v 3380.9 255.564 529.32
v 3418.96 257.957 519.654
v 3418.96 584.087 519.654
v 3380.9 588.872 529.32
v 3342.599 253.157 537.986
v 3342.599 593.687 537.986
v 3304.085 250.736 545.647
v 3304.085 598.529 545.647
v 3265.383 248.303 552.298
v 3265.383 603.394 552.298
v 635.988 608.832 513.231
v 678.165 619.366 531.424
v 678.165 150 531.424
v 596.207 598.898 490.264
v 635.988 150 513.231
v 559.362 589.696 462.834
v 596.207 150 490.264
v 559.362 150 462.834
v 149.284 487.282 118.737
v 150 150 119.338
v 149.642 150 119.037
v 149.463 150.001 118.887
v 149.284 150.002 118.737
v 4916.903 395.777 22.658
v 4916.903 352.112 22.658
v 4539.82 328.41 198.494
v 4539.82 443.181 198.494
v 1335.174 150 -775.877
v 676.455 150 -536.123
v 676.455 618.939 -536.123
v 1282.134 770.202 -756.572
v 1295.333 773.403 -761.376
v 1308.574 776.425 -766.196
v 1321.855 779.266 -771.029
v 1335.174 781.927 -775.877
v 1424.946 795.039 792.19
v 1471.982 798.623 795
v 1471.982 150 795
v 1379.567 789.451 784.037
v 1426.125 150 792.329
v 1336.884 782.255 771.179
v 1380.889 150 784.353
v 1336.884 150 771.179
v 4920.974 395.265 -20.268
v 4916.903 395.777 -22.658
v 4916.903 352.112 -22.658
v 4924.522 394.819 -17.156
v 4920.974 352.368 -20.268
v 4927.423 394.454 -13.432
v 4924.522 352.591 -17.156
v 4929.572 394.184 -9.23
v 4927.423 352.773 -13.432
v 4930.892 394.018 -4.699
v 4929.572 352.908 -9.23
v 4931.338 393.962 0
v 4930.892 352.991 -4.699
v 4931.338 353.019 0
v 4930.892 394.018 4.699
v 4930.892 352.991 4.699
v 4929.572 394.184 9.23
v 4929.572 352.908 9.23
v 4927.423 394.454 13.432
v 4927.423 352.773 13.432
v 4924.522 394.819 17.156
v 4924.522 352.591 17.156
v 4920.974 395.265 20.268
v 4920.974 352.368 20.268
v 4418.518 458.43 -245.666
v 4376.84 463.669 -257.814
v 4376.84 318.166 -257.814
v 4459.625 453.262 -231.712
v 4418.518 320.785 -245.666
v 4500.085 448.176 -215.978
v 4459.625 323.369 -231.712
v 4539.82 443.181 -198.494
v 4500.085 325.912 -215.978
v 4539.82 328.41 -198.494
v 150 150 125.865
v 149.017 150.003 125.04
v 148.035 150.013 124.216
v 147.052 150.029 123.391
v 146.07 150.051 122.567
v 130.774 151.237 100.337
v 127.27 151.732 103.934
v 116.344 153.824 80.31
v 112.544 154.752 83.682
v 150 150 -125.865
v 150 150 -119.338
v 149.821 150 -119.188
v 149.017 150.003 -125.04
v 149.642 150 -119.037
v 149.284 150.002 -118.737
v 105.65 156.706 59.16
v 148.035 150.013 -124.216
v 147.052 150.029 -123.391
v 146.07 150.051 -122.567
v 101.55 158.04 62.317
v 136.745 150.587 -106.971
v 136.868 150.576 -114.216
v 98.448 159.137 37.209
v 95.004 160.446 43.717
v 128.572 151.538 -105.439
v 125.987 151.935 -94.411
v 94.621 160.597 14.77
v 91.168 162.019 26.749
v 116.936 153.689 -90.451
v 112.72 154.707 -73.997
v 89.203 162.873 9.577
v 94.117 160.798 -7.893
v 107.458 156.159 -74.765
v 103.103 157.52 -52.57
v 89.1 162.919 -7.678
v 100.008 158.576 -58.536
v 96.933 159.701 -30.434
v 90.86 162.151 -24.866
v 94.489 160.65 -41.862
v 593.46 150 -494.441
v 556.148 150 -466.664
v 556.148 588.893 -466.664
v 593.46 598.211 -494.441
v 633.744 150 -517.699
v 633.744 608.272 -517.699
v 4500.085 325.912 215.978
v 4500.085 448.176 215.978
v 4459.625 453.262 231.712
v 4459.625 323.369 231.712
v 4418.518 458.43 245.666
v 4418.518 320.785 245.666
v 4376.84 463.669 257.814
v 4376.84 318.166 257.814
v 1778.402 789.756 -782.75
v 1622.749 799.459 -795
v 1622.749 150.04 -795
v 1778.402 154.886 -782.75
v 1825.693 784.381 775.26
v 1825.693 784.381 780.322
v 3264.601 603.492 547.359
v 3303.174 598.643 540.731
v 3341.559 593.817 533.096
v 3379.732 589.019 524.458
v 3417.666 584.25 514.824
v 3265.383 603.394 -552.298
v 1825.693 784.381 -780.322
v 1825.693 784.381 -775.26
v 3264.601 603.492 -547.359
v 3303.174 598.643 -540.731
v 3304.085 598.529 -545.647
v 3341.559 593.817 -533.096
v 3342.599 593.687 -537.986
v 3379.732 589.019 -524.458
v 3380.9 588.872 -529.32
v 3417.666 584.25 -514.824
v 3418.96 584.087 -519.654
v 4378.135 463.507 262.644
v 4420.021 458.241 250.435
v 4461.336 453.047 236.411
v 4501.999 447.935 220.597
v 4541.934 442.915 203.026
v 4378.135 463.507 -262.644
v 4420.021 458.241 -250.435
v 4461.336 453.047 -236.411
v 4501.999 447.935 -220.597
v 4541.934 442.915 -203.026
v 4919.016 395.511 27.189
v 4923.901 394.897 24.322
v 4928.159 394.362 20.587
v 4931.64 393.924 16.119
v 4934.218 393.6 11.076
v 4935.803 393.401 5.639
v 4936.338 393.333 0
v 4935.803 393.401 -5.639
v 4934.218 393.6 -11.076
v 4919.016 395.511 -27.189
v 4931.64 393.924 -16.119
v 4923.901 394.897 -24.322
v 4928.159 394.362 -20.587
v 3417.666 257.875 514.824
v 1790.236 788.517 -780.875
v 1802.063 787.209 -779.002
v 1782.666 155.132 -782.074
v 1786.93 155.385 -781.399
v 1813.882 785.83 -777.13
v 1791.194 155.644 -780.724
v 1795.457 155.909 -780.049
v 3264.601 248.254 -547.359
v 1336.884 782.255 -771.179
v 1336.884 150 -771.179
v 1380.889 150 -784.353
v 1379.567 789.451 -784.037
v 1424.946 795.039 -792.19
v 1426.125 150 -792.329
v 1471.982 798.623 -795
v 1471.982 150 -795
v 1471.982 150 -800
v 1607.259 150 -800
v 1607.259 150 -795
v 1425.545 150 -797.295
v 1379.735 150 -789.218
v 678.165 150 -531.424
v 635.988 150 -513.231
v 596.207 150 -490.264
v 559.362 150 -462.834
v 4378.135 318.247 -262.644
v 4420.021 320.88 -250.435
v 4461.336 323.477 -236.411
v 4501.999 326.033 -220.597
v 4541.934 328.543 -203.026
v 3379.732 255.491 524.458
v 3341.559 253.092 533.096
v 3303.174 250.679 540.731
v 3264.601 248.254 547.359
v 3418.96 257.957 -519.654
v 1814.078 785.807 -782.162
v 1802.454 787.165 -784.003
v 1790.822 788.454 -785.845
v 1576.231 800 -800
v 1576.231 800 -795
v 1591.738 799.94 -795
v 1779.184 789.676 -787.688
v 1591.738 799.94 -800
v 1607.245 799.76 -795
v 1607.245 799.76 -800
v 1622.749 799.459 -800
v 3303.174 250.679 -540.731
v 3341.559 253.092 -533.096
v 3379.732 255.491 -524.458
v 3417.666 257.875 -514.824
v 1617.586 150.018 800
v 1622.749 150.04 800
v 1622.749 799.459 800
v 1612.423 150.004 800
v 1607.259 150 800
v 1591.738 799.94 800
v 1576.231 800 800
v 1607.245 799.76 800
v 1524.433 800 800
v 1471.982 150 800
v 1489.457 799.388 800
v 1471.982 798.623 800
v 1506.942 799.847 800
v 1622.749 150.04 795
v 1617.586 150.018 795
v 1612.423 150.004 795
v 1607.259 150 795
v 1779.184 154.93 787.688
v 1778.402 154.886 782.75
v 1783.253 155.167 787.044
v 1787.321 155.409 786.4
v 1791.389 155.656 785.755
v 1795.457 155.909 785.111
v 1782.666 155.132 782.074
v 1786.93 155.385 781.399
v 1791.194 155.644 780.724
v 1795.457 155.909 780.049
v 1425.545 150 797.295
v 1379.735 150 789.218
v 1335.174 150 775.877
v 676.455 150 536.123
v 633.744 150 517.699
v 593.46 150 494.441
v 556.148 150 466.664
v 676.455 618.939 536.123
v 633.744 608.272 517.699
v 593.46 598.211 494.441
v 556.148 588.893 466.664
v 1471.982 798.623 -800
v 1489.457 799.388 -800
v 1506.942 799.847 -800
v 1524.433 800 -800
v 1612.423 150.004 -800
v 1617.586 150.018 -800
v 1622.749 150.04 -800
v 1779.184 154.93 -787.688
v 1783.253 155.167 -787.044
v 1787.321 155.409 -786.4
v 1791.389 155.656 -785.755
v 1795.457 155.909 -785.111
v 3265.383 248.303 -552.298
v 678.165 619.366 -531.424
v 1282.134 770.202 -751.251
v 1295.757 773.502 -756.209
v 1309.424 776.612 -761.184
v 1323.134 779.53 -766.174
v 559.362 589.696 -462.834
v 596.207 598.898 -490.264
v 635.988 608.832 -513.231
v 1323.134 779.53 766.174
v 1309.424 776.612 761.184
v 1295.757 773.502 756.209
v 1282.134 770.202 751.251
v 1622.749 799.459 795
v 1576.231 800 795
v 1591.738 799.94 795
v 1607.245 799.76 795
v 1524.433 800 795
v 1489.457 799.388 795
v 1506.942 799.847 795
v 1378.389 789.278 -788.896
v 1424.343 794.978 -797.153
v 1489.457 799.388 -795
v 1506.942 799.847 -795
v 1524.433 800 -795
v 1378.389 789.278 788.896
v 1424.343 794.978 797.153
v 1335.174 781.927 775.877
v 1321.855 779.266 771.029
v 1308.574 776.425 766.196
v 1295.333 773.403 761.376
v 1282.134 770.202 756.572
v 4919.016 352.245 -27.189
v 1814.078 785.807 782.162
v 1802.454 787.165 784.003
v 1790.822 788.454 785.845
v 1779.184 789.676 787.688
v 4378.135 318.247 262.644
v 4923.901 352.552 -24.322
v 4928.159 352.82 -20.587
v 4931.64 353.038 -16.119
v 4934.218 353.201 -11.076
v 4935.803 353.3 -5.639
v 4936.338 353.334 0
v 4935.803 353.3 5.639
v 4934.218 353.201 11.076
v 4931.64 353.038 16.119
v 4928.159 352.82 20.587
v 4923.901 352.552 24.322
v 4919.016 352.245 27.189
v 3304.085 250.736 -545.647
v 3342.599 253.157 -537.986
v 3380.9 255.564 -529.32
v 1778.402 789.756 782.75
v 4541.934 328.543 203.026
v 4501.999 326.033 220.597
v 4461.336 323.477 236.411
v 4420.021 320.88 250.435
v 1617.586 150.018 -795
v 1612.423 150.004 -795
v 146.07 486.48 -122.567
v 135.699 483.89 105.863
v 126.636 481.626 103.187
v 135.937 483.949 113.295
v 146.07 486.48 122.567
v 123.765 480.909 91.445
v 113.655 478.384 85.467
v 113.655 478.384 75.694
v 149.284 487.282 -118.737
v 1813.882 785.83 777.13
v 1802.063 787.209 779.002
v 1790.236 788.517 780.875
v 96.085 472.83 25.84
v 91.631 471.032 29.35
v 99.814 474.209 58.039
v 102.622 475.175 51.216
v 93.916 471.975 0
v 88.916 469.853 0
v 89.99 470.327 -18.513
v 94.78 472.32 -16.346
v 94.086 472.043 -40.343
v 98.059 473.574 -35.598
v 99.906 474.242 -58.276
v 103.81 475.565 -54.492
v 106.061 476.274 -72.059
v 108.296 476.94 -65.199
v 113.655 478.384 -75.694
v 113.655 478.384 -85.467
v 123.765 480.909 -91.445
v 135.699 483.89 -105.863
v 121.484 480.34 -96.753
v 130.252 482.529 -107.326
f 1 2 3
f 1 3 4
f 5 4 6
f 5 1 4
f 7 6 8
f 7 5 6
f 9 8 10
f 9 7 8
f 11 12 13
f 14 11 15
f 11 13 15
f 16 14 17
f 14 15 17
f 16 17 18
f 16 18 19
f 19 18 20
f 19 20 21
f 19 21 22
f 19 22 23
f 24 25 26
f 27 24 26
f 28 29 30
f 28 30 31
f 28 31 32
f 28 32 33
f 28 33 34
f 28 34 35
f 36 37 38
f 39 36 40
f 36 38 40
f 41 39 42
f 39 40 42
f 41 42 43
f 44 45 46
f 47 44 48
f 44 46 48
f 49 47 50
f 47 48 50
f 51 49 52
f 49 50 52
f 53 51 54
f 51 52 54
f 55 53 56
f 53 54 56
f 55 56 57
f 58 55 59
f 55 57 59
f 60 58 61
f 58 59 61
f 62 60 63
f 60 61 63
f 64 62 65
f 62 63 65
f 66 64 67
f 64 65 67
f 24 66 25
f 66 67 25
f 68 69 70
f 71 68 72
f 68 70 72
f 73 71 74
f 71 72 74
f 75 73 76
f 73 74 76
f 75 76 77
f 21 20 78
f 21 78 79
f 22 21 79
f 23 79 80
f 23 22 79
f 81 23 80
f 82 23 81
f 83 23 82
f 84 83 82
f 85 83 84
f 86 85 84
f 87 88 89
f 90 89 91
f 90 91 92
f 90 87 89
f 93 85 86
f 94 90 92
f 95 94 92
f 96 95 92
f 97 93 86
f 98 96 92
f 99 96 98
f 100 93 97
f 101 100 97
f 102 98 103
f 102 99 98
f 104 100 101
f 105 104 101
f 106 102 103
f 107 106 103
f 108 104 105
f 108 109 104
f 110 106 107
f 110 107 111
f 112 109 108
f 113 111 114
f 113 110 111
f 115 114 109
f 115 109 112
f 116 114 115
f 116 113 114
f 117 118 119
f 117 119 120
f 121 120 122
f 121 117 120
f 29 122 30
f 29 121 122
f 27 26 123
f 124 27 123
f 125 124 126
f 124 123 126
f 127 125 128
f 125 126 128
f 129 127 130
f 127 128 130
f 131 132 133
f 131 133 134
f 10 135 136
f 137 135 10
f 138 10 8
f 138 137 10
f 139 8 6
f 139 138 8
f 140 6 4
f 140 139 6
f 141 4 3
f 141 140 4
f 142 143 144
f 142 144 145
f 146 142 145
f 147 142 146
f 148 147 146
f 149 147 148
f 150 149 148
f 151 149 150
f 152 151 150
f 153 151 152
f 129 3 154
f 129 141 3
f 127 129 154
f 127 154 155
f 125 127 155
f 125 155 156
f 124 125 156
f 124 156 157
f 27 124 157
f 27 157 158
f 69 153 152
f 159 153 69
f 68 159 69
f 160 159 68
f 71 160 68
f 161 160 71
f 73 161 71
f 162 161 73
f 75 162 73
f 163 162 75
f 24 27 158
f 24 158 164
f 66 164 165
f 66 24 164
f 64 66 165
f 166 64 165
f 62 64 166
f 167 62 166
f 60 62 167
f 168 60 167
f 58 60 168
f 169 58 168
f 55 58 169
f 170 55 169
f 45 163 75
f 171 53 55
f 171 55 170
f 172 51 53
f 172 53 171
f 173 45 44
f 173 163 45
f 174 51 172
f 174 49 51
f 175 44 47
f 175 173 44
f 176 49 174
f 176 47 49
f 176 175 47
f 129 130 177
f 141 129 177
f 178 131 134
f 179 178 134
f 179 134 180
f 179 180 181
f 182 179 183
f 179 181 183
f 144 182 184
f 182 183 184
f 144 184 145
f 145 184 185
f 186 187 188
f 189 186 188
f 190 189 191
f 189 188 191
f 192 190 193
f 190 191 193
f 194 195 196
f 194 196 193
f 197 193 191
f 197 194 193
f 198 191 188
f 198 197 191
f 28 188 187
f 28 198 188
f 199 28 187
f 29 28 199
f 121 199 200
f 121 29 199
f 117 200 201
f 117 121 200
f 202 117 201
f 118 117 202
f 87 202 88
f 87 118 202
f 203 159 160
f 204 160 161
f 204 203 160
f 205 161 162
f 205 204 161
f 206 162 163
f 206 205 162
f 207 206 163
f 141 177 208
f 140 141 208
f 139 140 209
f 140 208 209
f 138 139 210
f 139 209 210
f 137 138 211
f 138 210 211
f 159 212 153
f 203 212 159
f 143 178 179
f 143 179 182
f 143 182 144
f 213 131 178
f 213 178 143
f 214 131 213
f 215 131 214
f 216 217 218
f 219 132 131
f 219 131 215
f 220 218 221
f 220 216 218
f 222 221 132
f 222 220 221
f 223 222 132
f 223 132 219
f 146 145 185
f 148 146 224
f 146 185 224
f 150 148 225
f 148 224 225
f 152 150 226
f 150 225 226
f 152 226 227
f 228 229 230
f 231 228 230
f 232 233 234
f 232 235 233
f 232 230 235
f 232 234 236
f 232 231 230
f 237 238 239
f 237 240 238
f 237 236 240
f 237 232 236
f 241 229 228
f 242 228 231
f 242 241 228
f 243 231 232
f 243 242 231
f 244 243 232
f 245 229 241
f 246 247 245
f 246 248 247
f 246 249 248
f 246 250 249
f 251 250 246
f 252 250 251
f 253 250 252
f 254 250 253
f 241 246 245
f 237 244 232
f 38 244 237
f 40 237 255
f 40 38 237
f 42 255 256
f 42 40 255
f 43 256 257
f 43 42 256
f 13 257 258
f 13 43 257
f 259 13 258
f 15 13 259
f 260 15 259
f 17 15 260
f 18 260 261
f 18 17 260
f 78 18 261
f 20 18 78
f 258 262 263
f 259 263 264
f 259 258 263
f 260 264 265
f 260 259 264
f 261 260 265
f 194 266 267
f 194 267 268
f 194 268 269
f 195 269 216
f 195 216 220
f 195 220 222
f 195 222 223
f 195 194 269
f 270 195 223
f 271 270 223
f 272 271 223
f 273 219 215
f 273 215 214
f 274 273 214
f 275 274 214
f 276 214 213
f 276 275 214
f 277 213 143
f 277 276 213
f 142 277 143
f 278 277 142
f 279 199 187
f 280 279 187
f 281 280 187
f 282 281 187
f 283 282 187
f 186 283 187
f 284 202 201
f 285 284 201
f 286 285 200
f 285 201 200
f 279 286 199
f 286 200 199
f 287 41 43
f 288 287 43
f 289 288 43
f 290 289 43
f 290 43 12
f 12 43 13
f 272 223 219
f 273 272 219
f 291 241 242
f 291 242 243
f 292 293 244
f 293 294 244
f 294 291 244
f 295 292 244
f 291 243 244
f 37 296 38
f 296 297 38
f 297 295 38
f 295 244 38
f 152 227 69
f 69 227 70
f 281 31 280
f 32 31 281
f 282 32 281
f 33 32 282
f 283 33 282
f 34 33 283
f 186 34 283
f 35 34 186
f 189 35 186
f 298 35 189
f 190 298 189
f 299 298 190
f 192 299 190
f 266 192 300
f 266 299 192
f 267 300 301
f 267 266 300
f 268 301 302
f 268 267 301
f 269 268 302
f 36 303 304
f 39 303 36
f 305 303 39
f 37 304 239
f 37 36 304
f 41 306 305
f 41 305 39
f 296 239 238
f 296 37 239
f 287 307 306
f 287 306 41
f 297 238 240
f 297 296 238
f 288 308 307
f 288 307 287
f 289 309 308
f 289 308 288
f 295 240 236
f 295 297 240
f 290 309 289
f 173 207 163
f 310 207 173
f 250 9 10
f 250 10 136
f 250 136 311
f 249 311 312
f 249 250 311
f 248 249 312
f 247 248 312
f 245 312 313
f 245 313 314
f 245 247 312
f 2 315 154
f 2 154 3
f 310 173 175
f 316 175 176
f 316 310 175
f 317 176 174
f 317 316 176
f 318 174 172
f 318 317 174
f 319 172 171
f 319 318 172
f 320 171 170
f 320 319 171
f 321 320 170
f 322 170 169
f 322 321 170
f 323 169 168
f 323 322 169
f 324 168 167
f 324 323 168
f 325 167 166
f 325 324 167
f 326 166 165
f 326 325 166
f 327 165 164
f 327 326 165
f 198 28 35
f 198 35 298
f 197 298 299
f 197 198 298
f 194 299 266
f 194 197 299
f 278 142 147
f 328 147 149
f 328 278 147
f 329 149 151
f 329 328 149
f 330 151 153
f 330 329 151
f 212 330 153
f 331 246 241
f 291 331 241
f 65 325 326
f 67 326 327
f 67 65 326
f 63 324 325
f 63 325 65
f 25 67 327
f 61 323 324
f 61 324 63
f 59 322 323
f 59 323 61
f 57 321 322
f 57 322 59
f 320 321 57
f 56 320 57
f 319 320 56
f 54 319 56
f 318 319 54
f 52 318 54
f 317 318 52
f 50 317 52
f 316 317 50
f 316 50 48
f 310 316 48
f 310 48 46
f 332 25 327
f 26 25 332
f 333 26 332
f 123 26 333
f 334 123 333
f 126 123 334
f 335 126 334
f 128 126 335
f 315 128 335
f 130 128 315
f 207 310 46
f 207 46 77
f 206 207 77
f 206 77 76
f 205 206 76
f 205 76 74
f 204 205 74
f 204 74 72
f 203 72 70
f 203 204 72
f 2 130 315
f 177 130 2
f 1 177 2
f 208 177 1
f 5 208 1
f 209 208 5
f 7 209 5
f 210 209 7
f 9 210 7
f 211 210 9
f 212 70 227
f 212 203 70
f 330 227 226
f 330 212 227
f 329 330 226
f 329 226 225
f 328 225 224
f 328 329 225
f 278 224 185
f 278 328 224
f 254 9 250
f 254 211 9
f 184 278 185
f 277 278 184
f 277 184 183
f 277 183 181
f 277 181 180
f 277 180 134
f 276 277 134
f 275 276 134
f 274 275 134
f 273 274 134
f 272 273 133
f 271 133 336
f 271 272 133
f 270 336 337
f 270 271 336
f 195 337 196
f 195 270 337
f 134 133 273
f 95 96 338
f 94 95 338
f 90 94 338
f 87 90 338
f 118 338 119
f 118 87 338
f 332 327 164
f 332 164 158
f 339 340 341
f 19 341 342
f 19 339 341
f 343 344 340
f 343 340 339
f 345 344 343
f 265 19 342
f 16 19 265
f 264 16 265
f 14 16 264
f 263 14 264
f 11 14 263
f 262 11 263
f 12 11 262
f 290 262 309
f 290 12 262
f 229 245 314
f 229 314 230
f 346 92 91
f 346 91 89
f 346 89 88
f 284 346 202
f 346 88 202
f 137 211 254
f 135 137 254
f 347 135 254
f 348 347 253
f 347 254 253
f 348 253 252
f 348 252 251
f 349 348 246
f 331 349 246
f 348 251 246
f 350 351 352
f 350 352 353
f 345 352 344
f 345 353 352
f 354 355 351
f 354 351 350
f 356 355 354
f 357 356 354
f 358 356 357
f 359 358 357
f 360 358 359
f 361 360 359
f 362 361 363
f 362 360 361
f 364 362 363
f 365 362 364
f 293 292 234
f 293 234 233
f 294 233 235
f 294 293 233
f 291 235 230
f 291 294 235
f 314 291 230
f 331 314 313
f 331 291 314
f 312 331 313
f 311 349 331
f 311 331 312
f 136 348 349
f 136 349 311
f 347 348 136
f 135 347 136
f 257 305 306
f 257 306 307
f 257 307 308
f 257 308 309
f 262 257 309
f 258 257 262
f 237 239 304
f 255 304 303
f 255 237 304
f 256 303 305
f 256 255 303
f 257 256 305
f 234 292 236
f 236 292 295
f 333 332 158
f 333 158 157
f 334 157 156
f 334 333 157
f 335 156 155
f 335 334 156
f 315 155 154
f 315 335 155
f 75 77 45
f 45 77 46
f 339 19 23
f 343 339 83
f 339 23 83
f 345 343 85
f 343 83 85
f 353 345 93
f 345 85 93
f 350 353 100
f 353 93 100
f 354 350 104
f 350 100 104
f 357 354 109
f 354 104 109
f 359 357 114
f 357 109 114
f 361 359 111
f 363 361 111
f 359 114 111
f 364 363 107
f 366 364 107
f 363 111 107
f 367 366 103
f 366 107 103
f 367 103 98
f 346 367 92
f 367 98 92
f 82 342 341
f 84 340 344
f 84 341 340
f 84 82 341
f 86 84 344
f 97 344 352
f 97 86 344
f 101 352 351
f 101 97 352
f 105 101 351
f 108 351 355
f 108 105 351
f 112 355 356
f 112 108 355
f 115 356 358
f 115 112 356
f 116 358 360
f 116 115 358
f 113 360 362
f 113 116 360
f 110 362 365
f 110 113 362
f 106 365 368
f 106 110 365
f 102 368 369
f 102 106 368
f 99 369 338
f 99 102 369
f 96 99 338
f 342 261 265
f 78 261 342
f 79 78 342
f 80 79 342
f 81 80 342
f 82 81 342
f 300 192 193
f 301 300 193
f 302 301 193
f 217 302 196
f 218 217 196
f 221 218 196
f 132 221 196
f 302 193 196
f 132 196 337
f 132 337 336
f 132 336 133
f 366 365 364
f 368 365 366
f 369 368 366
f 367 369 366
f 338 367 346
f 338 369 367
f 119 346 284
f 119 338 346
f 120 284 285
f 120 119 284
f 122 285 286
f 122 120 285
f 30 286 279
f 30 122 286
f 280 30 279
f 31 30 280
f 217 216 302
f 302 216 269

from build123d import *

# Parameters (mm, degrees)
TOPVIEW_EXTRUDE_DEPTH      = 800
SHELL1_T                   = -5
SIDEPROFILE_CUT_DEPTH      = 5065.329373382
SIDEPROFILE_CUT_DEPTH_BACK = 5065.329373382
SKETCH2_OUTSIDE_W          = 5882.814
SKETCH2_OUTSIDE_H          = 1835.392


with BuildPart() as part:
    # Sketch1 → TopView_Extrude (new body)
    with BuildSketch(Plane(origin=(0, 0, 0), x_dir=(1, 0, 0), z_dir=(0, 1, 0))):
        with BuildLine():
            Line((146.069849076, 122.567124227), (556.148324977, 466.663731547))
            ThreePointArc((556.148324977, 466.663731547), (613.263316637, 506.656075273), (676.455195963, 536.122941687))
            Line((676.455195963, 536.122941687), (1335.173700718, 775.877020708))
            ThreePointArc((1335.173700718, 775.877020708), (1402.522523085, 793.923094197), (1471.981833896, 800))
            Line((1471.981833896, 800), (1622.74932188, 800))
            ThreePointArc((1622.74932188, 800), (1701.208389168, 796.917335971), (1779.183730567, 787.688349521))
            Line((1779.183730567, 787.688349521), (3265.383087903, 552.297583021))
            ThreePointArc((3265.383087903, 552.297583021), (3342.599008928, 537.986460302), (3418.960120906, 519.653777172))
            Line((3418.960120906, 519.653777172), (4378.134590748, 262.643696963))
            ThreePointArc((4378.134590748, 262.643696963), (4461.335543574, 236.410539363), (4541.933526436, 203.025778355))
            Line((4541.933526436, 203.025778355), (4919.016455083, 27.18923681))
            ThreePointArc((4919.016455083, 27.18923681), (4936.337914092, 0), (4919.016455083, -27.18923681))
            Line((4919.016455083, -27.18923681), (4541.933526436, -203.025778355))
            ThreePointArc((4541.933526436, -203.025778355), (4461.335543574, -236.410539363), (4378.134590748, -262.643696963))
            Line((4378.134590748, -262.643696963), (3418.960120906, -519.653777172))
            ThreePointArc((3418.960120906, -519.653777172), (3342.599008928, -537.986460302), (3265.383087903, -552.297583021))
            Line((3265.383087903, -552.297583021), (1779.183730567, -787.688349521))
            ThreePointArc((1779.183730567, -787.688349521), (1701.208389168, -796.917335971), (1622.74932188, -800))
            Line((1622.74932188, -800), (1471.981833896, -800))
            ThreePointArc((1471.981833896, -800), (1402.522523085, -793.923094197), (1335.173700718, -775.877020708))
            Line((1335.173700718, -775.877020708), (676.455195963, -536.122941687))
            ThreePointArc((676.455195963, -536.122941687), (613.263316637, -506.656075273), (556.148324977, -466.663731547))
            Line((556.148324977, -466.663731547), (146.069849076, -122.567124227))
            ThreePointArc((146.069849076, -122.567124227), (88.915850742, 0), (146.069849076, 122.567124227))
        make_face()
    extrude(amount=TOPVIEW_EXTRUDE_DEPTH)

    # Shell1
    shell1_openings = [part.faces().sort_by_distance(p)[0] for p in [
        (2250.068887565, 800, 0),
        (2250.068887565, 0, 0),
    ]]
    offset(amount=SHELL1_T, openings=shell1_openings, kind=Kind.INTERSECTION)

    # Sketch2 outside → SideProfile_Cut (cut, two sides: drawn at the far end of the back side and taken through both)
    with BuildSketch(Plane.XY.offset(-SIDEPROFILE_CUT_DEPTH_BACK)):
        with Locations((2512.627, 400)):
            Rectangle(SKETCH2_OUTSIDE_W, SKETCH2_OUTSIDE_H)
        with BuildLine():
            Line((0, 300), (0, 332.854125267))
            ThreePointArc((0, 332.854125267), (31.780430043, 425.180358155), (113.65511039, 478.384359237))
            Line((113.65511039, 478.384359237), (1282.133703367, 770.201559797))
            ThreePointArc((1282.133703367, 770.201559797), (1402.370605908, 792.522432945), (1524.432967436, 800))
            Line((1524.432967436, 800), (1576.231046196, 800))
            ThreePointArc((1576.231046196, 800), (1701.206287536, 796.091478127), (1825.693060411, 784.381189052))
            Line((1825.693060411, 784.381189052), (4977.324, 388.181))
            Line((4977.324, 388.181), (4977.324, 355.91))
            Line((4977.324, 355.91), (1795.457321969, 155.908910924))
            ThreePointArc((1795.457321969, 155.908910924), (1701.40460764, 151.477591611), (1607.259154289, 150))
            Line((1607.259154289, 150), (150, 150))
            ThreePointArc((150, 150), (43.933982822, 193.933982822), (0, 300))
        make_face(mode=Mode.SUBTRACT)
    extrude(amount=SIDEPROFILE_CUT_DEPTH + SIDEPROFILE_CUT_DEPTH_BACK, mode=Mode.SUBTRACT)


solid = part.part
